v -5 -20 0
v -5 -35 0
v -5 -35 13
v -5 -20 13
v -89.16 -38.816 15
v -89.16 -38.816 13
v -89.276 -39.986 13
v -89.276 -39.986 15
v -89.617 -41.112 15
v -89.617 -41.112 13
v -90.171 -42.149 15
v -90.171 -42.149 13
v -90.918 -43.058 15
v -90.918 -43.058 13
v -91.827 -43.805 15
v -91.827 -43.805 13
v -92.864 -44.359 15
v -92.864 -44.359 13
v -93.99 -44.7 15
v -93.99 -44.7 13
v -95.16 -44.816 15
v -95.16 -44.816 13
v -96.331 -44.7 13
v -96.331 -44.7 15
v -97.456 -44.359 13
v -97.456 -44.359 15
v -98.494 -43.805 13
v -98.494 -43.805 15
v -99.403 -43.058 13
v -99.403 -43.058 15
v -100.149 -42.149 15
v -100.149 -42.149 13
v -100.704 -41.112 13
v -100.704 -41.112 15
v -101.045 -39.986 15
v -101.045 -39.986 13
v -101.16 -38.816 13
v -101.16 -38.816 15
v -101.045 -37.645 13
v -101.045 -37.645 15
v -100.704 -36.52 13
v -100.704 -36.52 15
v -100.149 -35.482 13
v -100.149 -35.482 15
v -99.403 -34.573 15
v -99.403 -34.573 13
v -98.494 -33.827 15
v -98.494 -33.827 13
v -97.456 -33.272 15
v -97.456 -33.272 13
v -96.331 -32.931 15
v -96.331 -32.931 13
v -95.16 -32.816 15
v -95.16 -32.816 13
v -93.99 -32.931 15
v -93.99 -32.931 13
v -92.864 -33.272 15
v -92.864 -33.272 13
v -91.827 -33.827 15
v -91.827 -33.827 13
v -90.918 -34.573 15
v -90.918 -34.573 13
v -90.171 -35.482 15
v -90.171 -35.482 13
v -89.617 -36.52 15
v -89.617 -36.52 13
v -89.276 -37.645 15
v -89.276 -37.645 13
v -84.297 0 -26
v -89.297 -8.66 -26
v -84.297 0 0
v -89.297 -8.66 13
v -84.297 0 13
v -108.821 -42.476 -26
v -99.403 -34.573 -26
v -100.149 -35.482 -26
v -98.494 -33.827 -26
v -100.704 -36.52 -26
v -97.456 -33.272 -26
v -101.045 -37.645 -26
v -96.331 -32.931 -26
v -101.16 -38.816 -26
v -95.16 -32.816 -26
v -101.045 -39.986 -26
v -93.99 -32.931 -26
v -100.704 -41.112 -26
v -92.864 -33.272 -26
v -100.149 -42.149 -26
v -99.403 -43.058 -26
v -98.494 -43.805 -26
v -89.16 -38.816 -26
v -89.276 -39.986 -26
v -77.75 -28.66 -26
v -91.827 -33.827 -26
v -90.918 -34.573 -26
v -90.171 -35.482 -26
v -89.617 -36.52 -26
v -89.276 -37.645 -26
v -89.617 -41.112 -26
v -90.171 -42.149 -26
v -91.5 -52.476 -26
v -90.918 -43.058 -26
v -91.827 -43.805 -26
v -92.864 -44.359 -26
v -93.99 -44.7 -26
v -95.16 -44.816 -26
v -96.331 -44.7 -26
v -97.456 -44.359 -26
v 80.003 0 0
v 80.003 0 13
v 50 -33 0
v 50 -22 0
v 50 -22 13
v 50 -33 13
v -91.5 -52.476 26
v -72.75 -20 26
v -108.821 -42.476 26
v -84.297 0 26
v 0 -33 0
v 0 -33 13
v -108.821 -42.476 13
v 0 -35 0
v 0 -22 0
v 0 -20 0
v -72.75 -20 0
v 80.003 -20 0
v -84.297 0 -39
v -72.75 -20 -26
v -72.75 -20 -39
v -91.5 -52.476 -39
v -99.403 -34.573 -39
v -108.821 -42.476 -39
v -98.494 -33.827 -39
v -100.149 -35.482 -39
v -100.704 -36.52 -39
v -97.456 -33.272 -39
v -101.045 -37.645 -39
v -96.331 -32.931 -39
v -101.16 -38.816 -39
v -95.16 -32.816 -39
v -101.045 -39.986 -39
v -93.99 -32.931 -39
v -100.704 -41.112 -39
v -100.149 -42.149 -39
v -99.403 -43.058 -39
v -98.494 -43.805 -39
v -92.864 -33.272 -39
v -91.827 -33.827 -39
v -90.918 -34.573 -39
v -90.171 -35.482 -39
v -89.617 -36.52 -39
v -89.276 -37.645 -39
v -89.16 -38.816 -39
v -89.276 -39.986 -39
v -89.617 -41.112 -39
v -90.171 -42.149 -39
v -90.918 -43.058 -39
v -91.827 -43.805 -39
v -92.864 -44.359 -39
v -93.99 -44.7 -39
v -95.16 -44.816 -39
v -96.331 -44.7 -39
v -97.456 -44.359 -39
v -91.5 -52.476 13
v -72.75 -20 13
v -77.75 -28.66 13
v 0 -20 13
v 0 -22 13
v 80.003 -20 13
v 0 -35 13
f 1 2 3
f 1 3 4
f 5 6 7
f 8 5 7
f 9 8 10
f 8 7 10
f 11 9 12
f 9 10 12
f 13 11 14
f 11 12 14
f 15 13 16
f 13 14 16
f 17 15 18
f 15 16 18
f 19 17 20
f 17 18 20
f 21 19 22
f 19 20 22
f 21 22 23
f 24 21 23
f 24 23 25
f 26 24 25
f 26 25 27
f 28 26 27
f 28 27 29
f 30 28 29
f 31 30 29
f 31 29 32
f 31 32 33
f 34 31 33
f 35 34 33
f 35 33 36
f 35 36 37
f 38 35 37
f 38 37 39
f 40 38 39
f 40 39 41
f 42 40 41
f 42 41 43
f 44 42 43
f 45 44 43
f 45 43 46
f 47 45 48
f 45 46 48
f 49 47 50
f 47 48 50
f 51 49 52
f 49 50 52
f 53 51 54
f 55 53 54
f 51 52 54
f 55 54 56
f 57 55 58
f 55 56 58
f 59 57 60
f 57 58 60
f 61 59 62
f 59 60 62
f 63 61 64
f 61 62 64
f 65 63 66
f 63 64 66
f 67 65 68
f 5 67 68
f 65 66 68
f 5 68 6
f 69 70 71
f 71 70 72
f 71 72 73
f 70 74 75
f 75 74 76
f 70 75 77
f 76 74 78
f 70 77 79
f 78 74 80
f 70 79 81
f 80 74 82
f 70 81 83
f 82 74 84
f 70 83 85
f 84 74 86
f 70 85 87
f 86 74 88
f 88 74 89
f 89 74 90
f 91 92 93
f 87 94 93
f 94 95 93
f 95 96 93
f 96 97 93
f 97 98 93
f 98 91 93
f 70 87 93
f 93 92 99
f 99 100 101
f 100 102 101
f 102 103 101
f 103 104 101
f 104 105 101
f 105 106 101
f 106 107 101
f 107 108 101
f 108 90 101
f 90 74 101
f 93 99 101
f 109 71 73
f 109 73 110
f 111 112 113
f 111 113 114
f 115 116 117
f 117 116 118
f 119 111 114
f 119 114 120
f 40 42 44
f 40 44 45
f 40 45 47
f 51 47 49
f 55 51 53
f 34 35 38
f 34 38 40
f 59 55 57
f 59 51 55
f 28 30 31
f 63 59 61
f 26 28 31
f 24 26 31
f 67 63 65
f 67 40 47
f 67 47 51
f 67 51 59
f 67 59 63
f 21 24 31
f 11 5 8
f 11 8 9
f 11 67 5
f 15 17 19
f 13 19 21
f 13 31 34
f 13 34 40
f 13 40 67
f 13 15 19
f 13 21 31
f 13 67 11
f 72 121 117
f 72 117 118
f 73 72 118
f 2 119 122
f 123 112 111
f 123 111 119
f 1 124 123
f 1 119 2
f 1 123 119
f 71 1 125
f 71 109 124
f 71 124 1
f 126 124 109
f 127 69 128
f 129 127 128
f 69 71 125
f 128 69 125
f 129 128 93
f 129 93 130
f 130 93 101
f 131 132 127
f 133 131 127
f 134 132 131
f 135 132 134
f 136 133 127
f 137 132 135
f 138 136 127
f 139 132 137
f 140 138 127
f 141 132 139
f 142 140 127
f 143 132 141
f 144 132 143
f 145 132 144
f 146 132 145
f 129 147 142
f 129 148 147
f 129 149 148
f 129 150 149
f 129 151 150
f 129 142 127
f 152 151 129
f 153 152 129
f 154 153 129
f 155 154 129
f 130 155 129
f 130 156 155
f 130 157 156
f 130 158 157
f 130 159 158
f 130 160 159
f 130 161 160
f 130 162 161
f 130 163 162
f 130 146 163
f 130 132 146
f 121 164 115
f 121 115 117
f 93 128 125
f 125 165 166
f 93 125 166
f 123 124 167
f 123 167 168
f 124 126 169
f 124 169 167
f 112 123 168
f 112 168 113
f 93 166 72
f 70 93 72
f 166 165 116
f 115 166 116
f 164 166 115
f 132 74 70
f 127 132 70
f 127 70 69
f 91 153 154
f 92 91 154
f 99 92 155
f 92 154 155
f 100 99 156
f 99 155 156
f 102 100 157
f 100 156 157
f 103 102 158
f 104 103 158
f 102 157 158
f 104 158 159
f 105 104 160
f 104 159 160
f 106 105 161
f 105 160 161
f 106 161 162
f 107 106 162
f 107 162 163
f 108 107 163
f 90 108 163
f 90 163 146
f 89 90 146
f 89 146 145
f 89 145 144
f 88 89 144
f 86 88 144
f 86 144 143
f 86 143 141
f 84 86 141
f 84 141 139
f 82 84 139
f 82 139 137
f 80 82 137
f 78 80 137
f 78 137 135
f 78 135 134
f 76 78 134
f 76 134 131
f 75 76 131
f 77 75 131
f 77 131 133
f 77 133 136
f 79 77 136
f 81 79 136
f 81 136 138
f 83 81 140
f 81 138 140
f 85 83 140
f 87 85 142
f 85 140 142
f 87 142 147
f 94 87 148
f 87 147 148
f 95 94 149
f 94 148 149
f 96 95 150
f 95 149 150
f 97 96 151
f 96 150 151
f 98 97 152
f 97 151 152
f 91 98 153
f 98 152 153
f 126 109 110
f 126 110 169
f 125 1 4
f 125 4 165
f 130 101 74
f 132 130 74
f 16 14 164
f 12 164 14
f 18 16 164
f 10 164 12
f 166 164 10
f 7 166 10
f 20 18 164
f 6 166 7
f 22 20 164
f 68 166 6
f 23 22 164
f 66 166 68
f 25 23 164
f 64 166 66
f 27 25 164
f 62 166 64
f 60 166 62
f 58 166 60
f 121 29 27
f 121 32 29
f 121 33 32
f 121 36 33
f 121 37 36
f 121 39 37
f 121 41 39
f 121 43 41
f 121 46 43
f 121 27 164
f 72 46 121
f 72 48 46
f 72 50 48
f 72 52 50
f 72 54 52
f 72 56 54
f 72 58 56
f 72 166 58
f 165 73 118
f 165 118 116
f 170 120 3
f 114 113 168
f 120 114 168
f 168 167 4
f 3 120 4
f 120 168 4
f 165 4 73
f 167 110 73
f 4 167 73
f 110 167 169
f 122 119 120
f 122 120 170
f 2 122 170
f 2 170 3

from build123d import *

# Parameters (mm, degrees)
PAD_DEPTH    = 13
PAD001_DEPTH = 13
PAD002_DEPTH = 26
PAD003_DEPTH = 13
SKETCH004_R  = 6
POCKET_DEPTH = 54


with BuildPart() as part:
    # Sketch → Pad (new body)
    with BuildSketch(Plane.XY):
        Polygon((-84.297005, 0), (80.002995, 0), (80.002995, -20), (0, -20), (0, -22), (50, -22), (50, -33), (0, -33), (0, -35), (-5, -35), (-5, -20), (-72.75, -20), (-77.75, -28.660254), (-89.297005, -8.660254), align=None)
    extrude(amount=PAD_DEPTH)

    # Sketch001 (on Face16 of Pad) → Pad001 (join)
    with BuildSketch(Plane.XY.offset(13)):
        Polygon((-84.297005, 0), (-72.75, -20), (-91.5, -52.475953), (-108.820508, -42.475953), align=None)
    extrude(amount=PAD001_DEPTH)

    # Sketch002 (on Face4 of Pad001) → Pad002 (join)
    with BuildSketch(Plane(origin=(0, 0, 0), x_dir=(1, 0, 0), z_dir=(0, 0, -1))):
        Polygon((-77.75, 28.660254), (-89.297005, 8.660254), (-84.297005, 0), (-72.75, 20), align=None)
    extrude(amount=PAD002_DEPTH)

    # Sketch003 (on Face23 of Pad002) → Pad003 (join)
    with BuildSketch(Plane(origin=(0, 0, -26), x_dir=(1, 0, 0), z_dir=(0, 0, -1))):
        Polygon((-72.75, 20), (-91.5, 52.475953), (-108.820508, 42.475953), (-84.297005, 0), align=None)
    extrude(amount=PAD003_DEPTH)

    # Sketch004 (on Face31 of Pad003) → Pocket (cut)
    with BuildSketch(Plane(origin=(0, 0, -39), x_dir=(1, 0, 0), z_dir=(0, 0, -1))):
        with Locations((-95.160254, 38.815699)):
            Circle(SKETCH004_R)
    extrude(amount=-POCKET_DEPTH, mode=Mode.SUBTRACT)


solid = part.part
